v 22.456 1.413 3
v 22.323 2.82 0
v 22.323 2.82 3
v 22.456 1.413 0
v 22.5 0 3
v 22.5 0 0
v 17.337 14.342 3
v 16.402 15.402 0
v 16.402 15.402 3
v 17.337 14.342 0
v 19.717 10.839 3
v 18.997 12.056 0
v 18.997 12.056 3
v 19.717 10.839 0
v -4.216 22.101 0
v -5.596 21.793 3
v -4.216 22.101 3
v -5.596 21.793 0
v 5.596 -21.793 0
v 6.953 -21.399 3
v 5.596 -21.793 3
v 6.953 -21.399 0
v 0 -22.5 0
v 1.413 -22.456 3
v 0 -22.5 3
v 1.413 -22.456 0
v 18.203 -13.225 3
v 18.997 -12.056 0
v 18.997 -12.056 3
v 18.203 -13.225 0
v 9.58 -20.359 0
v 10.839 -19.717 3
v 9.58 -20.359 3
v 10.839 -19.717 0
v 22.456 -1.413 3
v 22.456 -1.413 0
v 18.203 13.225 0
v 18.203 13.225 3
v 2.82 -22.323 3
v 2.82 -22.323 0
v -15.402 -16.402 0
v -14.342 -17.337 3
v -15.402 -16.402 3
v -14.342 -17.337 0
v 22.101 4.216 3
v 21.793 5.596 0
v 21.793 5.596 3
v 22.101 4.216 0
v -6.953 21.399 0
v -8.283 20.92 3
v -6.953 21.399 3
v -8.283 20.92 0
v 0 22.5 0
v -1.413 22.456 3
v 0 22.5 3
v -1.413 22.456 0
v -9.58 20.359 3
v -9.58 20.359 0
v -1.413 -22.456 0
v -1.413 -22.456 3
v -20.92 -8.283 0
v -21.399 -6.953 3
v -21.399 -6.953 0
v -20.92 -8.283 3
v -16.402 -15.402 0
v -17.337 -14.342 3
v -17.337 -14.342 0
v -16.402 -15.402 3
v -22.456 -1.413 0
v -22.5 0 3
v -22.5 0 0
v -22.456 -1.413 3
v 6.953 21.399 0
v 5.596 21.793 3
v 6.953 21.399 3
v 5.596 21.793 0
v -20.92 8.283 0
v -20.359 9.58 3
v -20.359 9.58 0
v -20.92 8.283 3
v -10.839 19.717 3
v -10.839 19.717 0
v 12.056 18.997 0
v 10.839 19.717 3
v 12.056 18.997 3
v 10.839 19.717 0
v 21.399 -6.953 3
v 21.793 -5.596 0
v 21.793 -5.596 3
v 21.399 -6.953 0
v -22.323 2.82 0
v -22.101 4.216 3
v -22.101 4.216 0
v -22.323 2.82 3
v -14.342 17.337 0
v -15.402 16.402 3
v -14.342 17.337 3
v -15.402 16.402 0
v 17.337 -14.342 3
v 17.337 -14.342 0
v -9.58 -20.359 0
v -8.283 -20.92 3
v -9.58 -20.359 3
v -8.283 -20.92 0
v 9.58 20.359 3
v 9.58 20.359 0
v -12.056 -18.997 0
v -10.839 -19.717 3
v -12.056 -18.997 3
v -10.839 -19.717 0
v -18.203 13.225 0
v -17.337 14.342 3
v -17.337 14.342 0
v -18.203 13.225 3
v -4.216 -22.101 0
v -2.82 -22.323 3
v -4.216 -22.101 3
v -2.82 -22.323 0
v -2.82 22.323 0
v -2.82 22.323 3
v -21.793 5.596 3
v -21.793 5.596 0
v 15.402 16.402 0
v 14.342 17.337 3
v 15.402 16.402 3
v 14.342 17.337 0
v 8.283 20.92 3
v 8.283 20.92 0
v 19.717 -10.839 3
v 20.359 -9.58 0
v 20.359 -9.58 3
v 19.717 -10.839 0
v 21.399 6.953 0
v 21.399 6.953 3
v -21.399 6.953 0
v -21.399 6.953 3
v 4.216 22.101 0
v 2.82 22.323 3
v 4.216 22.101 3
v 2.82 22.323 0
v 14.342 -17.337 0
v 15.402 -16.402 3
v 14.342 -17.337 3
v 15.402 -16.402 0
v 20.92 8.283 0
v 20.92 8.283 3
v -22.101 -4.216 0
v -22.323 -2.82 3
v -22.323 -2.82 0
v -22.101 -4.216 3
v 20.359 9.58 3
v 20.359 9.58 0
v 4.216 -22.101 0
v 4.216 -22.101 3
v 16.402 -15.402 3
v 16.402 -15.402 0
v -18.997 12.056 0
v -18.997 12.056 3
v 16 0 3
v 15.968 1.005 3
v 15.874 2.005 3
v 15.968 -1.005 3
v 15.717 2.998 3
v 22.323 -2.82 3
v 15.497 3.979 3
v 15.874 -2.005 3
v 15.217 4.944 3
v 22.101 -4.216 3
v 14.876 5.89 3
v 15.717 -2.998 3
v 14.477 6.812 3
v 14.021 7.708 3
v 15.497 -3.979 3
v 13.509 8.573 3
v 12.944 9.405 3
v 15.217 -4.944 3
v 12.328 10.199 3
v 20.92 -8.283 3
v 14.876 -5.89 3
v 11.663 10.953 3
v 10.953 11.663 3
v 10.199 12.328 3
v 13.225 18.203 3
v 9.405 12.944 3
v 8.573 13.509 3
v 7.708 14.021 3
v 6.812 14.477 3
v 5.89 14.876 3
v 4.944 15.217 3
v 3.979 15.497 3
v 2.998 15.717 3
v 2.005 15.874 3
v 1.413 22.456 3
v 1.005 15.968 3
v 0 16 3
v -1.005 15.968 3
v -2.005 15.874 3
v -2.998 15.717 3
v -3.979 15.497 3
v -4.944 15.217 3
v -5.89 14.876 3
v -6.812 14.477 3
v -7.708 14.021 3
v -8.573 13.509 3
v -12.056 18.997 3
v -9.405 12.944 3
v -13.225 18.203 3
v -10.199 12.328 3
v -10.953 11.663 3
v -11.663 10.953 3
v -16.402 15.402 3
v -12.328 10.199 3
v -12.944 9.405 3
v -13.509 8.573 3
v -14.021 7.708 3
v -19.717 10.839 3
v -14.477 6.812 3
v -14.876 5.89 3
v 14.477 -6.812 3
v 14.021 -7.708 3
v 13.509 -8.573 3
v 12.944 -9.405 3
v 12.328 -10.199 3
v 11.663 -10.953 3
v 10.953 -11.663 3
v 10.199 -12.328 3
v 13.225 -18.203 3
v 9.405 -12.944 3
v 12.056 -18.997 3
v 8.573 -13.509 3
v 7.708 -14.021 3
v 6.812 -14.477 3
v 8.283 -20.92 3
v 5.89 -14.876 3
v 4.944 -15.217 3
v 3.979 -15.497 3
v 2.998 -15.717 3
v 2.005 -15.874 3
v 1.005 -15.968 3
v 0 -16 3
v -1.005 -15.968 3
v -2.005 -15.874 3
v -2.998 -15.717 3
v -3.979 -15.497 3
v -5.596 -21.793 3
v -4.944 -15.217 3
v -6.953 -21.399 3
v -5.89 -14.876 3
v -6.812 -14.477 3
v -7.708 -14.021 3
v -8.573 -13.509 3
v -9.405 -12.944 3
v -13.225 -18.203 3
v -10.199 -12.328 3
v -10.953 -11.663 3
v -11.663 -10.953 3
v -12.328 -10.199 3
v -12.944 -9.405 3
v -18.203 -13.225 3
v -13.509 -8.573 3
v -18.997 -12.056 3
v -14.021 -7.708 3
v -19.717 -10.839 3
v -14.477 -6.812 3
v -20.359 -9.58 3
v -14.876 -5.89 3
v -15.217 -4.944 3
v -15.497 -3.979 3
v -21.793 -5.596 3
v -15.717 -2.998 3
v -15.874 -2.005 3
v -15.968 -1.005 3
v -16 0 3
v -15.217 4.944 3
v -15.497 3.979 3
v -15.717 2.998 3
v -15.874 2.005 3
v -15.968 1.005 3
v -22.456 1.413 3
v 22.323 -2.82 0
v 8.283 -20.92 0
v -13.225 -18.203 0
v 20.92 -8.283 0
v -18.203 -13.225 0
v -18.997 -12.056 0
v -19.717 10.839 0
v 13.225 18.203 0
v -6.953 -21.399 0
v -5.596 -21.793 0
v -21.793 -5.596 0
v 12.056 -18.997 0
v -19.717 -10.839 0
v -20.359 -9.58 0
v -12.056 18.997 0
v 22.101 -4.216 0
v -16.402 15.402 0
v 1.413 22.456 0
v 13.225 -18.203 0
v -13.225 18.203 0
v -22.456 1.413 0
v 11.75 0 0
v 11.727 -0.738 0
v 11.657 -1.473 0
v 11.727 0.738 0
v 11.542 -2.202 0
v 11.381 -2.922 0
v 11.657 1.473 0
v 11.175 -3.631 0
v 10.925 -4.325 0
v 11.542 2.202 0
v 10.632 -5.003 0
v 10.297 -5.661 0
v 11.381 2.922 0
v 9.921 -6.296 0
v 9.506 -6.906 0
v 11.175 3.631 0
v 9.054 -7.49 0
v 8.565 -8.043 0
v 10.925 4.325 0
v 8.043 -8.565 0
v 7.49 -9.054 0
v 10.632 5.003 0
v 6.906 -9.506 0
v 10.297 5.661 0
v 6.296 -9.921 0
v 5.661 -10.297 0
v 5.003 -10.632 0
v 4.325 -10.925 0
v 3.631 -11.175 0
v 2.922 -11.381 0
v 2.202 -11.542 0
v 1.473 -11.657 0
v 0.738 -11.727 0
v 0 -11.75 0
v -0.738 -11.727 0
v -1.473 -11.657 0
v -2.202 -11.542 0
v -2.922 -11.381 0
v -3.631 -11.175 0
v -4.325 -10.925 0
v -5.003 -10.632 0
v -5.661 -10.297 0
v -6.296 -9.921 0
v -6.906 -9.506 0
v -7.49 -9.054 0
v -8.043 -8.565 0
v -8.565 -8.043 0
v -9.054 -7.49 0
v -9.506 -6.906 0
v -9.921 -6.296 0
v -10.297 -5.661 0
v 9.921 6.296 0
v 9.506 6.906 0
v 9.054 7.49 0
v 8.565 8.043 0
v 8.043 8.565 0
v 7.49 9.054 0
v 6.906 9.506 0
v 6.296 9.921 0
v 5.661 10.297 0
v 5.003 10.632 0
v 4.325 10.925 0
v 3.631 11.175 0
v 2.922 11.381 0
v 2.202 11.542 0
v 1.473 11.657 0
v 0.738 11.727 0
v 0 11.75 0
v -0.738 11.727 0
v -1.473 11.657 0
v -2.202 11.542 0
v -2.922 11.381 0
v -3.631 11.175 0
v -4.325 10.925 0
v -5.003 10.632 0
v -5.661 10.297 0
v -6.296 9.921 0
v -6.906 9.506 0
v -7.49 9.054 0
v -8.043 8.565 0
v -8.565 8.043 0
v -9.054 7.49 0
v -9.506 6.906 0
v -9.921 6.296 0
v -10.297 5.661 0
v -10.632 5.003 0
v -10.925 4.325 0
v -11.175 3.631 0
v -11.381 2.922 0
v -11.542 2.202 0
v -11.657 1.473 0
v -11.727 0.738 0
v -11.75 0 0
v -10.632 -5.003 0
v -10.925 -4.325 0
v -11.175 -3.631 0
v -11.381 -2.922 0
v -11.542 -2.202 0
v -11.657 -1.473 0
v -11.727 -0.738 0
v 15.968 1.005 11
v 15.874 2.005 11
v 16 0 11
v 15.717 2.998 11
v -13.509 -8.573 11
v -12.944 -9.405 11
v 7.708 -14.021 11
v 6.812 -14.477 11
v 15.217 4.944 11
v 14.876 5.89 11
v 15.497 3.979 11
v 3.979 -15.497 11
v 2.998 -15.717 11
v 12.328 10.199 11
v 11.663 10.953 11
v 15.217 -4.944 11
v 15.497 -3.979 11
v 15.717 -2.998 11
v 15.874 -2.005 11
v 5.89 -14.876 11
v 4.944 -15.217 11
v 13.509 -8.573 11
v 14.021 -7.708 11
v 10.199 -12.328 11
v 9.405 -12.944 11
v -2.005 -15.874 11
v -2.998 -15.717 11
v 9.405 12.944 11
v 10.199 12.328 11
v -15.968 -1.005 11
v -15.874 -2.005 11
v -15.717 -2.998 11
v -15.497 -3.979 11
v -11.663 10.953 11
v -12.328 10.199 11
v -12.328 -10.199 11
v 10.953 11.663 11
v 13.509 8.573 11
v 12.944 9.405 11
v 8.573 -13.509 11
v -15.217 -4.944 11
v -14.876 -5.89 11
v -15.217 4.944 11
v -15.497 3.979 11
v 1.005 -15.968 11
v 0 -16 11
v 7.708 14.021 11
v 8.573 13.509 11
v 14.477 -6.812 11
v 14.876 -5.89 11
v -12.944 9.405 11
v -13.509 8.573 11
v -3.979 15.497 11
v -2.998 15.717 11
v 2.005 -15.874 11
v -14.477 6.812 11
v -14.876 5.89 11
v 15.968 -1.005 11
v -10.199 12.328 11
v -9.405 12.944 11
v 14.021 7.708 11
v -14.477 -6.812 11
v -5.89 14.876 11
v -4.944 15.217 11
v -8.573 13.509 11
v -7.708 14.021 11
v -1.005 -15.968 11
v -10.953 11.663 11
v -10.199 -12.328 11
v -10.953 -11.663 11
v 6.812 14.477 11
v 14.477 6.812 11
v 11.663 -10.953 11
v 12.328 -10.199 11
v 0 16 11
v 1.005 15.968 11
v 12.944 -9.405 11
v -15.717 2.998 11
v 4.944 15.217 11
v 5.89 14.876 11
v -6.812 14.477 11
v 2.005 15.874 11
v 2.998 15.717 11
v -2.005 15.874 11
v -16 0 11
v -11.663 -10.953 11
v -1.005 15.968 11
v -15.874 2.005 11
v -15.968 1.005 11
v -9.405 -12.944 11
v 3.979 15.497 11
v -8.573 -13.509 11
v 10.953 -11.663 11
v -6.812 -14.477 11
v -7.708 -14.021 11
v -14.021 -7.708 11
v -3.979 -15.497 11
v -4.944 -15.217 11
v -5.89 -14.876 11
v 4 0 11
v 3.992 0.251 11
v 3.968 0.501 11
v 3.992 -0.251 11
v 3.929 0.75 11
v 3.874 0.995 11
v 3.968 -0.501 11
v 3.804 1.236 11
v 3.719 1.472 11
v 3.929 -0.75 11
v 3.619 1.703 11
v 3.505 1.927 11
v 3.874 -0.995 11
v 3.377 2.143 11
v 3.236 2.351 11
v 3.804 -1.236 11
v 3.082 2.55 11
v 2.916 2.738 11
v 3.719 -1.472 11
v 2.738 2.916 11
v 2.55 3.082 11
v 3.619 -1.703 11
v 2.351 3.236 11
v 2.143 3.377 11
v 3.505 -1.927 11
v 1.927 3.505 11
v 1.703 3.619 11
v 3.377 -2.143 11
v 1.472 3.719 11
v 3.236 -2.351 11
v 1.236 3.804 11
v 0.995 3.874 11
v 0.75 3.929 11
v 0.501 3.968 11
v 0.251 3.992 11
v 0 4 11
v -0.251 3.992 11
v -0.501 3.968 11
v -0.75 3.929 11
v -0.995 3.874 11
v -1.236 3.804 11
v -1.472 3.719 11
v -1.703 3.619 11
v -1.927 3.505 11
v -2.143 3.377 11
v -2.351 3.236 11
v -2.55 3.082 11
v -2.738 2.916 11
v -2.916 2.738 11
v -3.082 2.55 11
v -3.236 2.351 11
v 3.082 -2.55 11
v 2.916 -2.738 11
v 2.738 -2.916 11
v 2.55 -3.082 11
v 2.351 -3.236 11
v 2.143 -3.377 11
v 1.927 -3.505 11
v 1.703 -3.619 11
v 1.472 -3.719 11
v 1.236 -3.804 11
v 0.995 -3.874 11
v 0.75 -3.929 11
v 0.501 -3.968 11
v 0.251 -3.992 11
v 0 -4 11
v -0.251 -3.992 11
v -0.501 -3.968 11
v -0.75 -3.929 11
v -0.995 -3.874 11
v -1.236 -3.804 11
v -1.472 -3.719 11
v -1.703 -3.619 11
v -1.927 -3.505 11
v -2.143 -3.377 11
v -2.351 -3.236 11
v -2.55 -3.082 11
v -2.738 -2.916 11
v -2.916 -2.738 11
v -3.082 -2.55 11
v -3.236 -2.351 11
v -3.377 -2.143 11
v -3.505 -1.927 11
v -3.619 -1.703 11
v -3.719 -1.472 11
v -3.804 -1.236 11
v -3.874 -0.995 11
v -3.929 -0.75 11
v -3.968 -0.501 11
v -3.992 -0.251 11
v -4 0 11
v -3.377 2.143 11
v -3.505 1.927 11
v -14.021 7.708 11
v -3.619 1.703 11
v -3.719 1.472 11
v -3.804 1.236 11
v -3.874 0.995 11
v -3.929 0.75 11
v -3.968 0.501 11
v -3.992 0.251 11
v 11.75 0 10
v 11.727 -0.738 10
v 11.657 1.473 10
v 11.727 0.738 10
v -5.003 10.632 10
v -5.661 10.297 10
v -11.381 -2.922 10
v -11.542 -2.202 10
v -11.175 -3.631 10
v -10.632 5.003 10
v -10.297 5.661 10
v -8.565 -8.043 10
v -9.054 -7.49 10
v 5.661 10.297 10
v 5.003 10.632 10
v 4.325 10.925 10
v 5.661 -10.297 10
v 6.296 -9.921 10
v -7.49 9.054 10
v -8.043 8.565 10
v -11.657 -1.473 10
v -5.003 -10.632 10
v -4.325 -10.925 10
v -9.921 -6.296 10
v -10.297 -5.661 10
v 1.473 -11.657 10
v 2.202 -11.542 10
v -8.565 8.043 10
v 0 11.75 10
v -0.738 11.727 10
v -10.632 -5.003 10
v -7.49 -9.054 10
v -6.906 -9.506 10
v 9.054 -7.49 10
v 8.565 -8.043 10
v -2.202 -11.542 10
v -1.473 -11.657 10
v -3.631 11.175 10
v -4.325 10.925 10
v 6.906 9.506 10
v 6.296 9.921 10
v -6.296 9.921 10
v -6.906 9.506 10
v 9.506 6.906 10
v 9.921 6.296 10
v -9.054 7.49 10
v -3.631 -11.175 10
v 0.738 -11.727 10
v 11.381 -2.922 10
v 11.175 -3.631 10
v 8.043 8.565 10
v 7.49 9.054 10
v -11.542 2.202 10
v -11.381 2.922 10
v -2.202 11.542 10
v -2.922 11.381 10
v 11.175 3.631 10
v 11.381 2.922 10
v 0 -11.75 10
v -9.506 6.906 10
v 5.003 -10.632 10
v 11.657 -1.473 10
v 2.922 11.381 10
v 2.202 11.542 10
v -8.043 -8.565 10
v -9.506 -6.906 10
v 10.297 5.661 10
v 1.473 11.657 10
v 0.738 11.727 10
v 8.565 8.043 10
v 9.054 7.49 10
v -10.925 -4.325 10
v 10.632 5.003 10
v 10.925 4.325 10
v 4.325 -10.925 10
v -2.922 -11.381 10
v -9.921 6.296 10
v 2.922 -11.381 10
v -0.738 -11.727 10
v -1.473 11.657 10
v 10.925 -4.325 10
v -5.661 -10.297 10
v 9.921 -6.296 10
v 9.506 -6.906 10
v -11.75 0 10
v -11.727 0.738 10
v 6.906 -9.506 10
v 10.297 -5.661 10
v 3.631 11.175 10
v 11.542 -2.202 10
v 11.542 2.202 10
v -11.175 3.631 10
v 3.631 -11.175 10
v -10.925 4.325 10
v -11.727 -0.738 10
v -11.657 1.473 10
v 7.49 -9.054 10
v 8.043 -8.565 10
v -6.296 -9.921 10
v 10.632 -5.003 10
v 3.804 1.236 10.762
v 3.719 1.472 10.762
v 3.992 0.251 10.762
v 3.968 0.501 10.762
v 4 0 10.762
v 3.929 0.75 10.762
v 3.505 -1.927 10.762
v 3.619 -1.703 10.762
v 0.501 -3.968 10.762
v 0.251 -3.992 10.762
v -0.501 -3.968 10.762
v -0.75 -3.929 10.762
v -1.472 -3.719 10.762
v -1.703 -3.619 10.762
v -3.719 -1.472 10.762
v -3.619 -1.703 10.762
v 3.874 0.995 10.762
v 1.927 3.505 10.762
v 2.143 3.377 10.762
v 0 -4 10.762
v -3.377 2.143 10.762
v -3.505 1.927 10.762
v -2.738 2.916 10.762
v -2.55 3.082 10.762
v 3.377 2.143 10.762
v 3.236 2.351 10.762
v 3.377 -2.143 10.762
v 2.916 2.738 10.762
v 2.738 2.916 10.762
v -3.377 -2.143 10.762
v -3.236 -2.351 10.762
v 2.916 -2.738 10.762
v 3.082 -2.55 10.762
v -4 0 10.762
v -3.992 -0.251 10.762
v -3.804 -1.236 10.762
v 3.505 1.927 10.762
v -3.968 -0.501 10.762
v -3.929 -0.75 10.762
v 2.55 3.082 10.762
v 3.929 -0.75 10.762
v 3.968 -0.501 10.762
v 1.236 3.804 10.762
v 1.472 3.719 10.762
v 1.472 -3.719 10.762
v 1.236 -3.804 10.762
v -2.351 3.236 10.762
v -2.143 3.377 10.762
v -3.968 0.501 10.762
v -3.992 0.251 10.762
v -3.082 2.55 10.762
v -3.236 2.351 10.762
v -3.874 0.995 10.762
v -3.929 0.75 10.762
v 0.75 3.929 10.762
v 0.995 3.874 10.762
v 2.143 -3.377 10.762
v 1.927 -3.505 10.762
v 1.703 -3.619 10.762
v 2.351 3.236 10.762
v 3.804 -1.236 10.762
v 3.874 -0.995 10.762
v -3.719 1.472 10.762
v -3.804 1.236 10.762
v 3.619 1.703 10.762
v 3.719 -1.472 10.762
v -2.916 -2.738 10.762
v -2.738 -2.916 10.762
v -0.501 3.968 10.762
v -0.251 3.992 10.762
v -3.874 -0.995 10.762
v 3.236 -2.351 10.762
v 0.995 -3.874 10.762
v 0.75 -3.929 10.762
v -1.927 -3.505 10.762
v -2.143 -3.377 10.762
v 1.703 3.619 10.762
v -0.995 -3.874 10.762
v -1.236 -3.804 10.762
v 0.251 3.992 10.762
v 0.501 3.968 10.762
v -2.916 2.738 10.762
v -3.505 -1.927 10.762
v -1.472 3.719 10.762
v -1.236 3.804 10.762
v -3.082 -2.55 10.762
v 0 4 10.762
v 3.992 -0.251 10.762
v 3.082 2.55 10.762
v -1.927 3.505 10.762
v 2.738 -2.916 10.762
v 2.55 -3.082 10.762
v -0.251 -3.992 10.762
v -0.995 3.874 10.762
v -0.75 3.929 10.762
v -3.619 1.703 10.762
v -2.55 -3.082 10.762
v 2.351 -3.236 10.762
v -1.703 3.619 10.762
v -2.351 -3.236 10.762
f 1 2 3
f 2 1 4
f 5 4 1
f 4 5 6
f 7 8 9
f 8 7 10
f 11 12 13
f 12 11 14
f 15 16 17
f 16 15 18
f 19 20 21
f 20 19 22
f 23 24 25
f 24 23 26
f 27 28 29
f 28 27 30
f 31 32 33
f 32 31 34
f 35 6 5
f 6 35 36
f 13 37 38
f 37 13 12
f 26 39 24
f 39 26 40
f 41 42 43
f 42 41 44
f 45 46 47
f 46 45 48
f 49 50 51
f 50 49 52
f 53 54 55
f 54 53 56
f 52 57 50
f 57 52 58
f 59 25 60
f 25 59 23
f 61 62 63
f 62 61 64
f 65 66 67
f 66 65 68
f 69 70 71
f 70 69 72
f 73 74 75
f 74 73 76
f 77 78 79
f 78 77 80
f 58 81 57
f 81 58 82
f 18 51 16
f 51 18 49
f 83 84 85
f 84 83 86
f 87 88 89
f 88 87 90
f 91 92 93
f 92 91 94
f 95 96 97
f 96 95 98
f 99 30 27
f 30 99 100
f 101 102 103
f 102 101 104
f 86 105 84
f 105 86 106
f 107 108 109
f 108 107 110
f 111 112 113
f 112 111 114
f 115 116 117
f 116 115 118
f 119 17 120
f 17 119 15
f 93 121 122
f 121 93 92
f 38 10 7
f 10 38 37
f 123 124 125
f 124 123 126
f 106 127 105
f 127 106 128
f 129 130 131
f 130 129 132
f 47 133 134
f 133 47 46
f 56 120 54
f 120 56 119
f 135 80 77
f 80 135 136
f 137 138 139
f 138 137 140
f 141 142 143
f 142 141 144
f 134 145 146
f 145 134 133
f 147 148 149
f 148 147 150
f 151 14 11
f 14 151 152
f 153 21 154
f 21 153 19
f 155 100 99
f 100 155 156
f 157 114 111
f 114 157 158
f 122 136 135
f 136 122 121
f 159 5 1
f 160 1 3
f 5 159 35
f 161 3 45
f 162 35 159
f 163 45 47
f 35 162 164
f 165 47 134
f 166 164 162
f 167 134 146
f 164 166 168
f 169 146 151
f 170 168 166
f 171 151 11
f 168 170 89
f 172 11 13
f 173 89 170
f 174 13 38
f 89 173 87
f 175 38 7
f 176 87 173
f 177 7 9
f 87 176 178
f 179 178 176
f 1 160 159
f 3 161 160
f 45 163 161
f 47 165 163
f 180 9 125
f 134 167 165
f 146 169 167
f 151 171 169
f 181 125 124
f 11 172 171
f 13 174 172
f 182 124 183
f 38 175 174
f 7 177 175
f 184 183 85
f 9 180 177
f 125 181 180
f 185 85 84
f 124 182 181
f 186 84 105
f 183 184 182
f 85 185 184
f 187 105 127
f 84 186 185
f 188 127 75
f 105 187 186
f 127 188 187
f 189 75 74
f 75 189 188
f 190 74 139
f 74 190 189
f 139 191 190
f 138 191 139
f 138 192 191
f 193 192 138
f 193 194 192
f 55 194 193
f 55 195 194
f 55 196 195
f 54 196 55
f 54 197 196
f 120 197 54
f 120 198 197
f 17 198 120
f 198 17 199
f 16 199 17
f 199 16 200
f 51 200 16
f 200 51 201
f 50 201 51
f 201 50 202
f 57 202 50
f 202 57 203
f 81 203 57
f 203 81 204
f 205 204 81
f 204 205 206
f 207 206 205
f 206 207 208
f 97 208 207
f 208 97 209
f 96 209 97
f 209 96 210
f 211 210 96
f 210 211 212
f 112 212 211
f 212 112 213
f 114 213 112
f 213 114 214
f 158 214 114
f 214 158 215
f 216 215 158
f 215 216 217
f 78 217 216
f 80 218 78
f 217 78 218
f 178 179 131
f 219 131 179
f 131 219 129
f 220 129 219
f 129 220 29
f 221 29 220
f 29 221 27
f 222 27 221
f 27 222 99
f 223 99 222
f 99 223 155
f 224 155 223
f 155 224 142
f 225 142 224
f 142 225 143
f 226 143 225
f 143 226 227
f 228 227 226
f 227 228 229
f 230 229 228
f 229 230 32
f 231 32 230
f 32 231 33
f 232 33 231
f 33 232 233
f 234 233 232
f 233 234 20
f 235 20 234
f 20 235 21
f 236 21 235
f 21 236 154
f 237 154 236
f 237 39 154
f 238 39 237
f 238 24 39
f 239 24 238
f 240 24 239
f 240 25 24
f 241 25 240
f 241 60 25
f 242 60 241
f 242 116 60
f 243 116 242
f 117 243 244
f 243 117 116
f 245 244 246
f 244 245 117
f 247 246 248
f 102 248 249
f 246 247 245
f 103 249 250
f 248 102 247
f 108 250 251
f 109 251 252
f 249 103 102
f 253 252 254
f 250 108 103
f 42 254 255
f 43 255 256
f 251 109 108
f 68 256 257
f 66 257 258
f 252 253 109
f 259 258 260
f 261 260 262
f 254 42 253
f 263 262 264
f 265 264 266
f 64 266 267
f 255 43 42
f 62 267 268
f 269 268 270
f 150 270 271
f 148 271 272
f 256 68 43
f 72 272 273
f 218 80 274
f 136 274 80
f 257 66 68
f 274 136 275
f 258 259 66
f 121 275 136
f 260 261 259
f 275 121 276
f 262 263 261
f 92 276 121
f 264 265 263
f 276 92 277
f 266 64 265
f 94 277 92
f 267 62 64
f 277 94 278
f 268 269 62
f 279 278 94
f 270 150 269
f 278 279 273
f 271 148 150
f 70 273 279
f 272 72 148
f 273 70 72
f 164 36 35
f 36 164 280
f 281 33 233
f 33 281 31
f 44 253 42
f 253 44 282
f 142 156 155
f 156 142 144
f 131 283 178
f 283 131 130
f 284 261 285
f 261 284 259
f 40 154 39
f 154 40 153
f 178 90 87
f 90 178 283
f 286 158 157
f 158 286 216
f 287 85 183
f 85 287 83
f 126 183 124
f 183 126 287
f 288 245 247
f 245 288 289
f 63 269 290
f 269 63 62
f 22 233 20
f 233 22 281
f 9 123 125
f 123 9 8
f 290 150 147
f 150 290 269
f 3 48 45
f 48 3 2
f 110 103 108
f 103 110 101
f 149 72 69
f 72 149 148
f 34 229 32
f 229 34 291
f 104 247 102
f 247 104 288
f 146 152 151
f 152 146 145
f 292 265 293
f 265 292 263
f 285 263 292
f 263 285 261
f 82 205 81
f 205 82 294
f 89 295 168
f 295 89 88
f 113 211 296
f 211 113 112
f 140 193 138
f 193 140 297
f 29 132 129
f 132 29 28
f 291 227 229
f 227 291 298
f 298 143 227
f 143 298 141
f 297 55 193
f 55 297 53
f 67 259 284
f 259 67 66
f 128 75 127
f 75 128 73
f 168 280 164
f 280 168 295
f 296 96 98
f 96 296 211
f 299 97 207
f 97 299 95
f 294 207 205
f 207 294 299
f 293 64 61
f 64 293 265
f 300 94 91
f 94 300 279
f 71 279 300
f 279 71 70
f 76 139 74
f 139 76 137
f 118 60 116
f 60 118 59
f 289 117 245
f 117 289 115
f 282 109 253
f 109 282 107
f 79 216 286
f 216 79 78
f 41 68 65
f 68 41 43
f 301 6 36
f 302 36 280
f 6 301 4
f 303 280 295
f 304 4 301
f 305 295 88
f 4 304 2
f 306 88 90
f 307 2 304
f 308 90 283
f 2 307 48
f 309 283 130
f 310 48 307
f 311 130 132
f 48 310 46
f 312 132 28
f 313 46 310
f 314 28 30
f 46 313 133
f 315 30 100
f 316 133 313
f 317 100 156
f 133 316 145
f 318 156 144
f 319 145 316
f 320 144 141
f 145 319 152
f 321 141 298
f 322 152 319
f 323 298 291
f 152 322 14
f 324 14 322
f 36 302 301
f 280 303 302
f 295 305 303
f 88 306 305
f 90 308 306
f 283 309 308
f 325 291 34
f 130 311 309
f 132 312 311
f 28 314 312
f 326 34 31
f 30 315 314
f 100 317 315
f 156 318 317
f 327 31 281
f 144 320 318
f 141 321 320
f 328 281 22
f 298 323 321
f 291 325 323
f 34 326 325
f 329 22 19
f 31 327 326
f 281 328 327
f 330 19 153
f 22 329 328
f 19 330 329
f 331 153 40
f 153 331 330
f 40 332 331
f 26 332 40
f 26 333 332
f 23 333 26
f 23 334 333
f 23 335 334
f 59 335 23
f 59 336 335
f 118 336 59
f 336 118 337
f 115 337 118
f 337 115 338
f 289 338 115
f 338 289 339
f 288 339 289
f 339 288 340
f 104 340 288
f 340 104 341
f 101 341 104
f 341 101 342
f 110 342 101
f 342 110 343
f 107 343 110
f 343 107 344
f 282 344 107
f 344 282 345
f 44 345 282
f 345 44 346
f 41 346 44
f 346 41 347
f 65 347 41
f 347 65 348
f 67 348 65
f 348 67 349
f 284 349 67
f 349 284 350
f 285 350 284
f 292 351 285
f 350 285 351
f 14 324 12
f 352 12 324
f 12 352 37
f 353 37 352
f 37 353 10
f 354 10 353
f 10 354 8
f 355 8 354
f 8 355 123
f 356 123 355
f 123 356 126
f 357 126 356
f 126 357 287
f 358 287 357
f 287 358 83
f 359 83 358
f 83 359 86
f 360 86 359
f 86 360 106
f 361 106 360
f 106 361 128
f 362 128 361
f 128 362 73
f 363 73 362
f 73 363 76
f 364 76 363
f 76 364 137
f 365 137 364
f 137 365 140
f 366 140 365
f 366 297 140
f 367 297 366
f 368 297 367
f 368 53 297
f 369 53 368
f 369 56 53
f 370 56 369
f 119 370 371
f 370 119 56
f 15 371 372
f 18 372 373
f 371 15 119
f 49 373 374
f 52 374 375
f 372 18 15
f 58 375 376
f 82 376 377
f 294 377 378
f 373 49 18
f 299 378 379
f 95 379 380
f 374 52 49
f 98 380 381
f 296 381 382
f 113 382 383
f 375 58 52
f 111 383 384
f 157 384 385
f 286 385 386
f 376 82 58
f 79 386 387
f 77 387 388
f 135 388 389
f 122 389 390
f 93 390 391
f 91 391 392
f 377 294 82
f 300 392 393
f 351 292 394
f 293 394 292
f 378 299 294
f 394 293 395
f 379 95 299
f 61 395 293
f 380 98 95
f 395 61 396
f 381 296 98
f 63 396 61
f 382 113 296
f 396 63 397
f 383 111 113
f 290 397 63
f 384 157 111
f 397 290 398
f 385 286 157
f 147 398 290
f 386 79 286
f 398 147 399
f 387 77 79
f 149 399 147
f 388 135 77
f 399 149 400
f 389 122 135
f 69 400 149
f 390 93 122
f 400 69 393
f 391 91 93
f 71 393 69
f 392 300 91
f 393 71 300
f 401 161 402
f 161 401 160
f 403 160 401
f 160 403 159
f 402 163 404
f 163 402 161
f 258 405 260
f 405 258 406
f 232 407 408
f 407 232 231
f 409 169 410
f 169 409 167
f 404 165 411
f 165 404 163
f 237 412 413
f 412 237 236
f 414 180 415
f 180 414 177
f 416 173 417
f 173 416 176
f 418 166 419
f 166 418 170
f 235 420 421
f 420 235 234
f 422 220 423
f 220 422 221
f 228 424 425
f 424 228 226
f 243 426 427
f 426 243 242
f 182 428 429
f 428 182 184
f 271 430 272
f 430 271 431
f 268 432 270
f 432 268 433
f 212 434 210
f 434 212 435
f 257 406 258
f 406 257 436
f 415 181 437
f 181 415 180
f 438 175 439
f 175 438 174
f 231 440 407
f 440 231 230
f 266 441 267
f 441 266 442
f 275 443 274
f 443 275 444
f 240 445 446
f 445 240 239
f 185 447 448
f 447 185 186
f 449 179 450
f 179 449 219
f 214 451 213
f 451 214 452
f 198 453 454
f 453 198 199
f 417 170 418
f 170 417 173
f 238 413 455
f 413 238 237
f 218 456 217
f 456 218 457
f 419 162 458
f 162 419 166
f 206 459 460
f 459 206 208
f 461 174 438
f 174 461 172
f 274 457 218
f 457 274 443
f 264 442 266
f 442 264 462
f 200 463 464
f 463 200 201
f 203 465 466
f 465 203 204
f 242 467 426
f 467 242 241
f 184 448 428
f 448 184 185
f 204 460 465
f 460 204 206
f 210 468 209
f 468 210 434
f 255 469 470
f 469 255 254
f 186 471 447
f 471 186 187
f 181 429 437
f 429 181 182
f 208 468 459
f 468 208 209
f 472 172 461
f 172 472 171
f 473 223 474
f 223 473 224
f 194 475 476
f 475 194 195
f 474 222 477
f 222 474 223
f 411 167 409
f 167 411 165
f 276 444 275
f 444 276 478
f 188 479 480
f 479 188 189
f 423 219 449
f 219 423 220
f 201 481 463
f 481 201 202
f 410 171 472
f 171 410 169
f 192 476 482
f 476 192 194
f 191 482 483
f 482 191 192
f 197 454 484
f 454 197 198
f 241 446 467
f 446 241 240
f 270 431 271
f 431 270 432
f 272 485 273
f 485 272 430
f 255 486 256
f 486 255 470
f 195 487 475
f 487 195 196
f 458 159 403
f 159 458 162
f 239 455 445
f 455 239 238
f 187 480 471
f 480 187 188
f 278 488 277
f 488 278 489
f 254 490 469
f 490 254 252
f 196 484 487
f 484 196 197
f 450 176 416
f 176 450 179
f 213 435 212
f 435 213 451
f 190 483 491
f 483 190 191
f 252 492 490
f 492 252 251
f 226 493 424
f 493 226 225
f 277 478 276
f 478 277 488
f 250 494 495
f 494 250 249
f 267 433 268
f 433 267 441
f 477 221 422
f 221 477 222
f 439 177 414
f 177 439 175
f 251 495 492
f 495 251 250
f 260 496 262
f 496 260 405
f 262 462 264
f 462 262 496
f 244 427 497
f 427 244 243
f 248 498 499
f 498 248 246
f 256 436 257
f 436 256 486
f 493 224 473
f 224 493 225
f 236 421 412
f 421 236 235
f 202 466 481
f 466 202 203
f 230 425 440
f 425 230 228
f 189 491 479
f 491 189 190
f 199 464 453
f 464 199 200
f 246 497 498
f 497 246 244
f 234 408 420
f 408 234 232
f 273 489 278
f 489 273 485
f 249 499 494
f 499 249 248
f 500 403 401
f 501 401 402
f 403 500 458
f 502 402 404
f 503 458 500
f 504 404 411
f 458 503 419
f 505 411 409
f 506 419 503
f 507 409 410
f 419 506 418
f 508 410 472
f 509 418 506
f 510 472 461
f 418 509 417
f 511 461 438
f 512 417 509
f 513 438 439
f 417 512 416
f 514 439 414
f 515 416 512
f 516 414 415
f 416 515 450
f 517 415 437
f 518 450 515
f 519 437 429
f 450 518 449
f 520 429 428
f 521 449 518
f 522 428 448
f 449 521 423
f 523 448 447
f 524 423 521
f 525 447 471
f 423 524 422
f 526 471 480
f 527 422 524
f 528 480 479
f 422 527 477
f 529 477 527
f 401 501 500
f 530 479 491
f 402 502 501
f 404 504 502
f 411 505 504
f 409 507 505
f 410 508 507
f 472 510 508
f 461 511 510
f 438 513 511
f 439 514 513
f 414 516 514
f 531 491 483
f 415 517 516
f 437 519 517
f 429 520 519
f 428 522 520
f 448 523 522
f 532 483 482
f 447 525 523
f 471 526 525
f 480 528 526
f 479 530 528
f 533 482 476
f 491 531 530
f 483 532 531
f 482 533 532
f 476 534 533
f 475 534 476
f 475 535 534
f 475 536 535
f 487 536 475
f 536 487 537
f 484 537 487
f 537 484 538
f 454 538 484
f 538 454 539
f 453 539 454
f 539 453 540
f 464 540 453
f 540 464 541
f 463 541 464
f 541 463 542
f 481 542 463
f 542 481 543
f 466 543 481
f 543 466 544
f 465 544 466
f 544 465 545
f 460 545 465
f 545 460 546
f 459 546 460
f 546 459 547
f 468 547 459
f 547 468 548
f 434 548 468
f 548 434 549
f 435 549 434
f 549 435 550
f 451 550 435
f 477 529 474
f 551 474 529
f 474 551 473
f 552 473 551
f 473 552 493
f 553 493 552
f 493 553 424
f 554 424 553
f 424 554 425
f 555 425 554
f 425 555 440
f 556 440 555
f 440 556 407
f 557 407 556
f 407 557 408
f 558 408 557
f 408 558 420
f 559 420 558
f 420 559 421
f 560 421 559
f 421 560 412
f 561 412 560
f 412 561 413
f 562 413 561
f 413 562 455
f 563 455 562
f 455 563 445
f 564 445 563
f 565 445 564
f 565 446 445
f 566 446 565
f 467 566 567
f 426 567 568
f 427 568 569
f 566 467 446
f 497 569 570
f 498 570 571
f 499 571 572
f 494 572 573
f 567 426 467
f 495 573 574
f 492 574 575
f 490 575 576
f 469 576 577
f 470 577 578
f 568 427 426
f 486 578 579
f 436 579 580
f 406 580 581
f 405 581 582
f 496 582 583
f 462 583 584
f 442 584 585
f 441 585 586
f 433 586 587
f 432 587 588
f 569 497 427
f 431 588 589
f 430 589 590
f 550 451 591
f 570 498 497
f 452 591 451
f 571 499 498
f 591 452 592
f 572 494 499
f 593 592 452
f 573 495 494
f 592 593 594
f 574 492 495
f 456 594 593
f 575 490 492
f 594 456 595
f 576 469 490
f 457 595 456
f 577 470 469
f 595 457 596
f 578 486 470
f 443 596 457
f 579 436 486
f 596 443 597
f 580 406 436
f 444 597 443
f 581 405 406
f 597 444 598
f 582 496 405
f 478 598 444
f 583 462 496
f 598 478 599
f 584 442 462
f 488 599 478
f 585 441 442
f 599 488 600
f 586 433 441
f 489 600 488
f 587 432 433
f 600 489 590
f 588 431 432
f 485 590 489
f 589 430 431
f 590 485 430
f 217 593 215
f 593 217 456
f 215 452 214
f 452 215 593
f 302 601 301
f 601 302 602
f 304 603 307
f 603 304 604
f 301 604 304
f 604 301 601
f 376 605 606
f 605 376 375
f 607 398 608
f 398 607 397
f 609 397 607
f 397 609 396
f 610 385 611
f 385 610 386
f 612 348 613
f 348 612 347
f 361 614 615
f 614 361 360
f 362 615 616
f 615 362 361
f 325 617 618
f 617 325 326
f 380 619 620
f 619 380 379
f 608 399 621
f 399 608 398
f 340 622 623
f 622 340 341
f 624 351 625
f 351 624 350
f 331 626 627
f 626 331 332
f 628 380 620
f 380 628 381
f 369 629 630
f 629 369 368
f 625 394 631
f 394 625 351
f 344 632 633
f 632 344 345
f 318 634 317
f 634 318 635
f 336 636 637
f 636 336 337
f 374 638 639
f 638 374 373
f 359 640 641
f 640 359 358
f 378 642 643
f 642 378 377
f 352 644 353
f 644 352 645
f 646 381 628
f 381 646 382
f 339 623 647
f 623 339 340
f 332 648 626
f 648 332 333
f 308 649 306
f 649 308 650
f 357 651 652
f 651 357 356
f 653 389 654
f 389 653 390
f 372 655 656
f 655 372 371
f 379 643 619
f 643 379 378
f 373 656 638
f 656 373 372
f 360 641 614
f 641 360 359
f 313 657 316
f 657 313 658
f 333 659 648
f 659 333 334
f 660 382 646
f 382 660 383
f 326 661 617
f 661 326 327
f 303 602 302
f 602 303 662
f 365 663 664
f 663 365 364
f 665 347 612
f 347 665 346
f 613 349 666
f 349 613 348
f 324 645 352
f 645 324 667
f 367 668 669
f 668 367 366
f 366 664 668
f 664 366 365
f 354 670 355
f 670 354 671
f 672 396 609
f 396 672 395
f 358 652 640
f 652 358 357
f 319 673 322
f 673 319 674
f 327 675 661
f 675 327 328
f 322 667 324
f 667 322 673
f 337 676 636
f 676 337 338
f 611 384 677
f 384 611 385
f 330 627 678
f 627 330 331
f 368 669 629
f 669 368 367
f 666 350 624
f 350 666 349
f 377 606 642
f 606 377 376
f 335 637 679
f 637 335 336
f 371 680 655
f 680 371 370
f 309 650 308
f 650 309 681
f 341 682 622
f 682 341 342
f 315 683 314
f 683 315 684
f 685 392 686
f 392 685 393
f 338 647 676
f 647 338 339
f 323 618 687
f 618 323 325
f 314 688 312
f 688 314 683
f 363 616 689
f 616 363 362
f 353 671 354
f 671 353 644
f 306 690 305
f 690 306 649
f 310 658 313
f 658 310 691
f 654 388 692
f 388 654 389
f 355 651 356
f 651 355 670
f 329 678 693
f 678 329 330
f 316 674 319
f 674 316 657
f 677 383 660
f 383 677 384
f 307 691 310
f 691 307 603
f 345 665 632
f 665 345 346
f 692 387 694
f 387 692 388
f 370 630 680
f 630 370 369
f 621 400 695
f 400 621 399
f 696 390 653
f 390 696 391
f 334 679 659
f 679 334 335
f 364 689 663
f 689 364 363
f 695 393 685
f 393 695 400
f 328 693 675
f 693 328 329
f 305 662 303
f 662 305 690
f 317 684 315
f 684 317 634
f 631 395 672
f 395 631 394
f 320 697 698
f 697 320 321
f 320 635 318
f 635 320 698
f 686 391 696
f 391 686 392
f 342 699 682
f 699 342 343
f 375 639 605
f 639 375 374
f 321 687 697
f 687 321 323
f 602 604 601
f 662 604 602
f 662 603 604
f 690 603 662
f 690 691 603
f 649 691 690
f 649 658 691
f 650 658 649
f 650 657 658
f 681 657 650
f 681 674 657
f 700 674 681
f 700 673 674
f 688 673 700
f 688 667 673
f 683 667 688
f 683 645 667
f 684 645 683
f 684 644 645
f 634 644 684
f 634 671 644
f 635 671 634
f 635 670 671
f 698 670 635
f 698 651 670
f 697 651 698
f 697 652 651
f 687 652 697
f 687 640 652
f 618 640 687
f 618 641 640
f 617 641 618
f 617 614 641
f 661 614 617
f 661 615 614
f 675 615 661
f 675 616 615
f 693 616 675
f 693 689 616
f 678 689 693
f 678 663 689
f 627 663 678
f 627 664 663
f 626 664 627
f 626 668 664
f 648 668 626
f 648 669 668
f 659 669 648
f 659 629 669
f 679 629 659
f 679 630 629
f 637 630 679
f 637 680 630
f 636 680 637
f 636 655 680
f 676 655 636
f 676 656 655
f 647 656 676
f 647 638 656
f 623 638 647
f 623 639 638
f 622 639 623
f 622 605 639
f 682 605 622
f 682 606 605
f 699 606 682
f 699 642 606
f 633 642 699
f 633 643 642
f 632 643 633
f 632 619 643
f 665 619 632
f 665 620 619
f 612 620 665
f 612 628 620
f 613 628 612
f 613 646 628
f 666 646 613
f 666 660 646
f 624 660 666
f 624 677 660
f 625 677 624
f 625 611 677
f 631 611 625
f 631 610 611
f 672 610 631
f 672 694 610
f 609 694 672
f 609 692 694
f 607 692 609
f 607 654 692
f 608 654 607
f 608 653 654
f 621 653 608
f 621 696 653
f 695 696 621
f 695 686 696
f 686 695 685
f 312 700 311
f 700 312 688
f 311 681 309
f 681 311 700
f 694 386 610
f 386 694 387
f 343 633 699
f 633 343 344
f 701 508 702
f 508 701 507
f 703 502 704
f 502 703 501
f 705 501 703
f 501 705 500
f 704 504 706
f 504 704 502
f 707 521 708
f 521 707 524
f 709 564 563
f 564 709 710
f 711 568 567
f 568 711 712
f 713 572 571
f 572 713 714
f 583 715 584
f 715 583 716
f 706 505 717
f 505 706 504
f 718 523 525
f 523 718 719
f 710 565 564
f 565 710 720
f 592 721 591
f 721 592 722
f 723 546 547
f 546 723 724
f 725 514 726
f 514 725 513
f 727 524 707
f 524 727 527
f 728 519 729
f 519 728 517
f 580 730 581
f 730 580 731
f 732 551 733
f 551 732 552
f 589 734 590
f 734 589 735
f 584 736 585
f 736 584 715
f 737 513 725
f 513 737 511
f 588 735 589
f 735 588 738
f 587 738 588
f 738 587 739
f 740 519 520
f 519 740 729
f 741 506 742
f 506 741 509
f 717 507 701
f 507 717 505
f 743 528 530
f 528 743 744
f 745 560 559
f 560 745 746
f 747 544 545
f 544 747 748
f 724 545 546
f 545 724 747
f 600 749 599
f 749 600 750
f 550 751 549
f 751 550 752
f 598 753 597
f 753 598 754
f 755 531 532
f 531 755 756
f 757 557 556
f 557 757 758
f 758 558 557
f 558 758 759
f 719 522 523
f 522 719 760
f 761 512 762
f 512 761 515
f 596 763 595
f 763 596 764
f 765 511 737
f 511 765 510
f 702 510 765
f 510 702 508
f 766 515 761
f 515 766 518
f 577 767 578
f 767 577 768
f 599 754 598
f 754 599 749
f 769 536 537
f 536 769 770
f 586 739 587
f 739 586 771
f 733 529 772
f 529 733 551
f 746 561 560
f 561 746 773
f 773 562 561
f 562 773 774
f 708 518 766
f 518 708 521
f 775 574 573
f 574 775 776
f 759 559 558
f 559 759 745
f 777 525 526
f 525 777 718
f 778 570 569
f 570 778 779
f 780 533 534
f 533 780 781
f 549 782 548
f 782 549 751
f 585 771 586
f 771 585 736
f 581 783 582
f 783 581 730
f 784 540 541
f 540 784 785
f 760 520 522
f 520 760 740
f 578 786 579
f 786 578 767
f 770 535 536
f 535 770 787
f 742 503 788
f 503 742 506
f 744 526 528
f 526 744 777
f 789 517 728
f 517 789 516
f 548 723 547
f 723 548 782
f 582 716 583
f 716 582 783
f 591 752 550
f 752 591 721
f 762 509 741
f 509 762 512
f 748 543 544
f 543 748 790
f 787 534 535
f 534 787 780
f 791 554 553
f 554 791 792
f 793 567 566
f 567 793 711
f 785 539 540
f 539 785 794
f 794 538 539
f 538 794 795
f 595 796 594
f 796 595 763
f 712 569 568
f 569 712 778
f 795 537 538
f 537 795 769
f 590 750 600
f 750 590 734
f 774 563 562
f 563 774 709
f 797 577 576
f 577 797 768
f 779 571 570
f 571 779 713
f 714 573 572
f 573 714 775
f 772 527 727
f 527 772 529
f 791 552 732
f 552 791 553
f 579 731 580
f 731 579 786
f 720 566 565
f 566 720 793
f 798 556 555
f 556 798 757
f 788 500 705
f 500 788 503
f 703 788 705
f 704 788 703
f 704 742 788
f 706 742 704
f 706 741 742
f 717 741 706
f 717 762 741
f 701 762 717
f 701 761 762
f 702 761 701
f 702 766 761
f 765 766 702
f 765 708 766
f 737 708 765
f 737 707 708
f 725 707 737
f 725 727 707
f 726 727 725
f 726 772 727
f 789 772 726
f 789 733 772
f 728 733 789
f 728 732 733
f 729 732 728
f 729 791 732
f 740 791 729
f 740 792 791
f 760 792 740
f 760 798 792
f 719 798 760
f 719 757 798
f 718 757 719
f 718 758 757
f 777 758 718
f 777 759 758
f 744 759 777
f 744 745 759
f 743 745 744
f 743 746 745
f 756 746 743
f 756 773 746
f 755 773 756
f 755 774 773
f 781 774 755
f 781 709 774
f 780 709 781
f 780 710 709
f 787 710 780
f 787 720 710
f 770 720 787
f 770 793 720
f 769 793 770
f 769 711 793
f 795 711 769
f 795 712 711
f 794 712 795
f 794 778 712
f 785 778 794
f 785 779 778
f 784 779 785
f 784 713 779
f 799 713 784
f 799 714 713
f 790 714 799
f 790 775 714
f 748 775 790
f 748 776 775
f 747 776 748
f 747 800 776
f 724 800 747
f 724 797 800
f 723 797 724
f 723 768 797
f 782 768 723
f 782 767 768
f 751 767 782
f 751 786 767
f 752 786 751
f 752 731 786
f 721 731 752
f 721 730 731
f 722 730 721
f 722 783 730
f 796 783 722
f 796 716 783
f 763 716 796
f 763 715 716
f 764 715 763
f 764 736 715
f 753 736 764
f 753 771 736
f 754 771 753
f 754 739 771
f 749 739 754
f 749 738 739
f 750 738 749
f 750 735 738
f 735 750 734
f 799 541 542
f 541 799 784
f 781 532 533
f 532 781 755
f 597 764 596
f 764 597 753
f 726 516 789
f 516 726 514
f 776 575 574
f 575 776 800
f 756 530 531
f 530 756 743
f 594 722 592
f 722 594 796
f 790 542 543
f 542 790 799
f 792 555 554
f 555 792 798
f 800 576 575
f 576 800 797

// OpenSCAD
// [FL_INDEX: keywords="openscad, 3d_parametric, Parametric_Filament_spindle_bearing_adapter, csg_solid" | COT="Parametric OpenSCAD design from 3DCodeverse"]
// Title: Parametric Filament spindle bearing adapter

/* spindle bearing adapter for Filament spools
	 by Kevin Osborn 
*/
// dimensions in mm
// How far into the spindle you want the hub
Spindle_length = 8;
// The size of your hole
Spindle_diameter = 32;
// Diameter of your axel/threaded rod
Axel_diameter = 8;
// Thickness in mm of the brim
Brim_height = 3;
// Width of the brim outside the spindle
Brim_width =13;//[0:50]
/* [Advanced] */
Layer_height = .254;
skate_recess_height = 10;
inner_wall_thick = Layer_height *3;
/* [Hidden] */
Brim_diameter = Spindle_diameter+Brim_width;
$fn=100;

difference()
{
  union()// the outside hat
   {
   cylinder(Brim_height,Brim_diameter/2,Brim_diameter/2);	
   translate ([0,0,Brim_height]) cylinder (Spindle_length,Spindle_diameter/2,Spindle_diameter/2);//Spindle part
	
   }
   union()
    {
    cylinder(skate_recess_height,11.75,11.75); // skate bearing recess
    translate([0,0,skate_recess_height +inner_wall_thick]) cylinder(Spindle_length+Brim_height,Axel_diameter/2,Axel_diameter/2);
    }

}
